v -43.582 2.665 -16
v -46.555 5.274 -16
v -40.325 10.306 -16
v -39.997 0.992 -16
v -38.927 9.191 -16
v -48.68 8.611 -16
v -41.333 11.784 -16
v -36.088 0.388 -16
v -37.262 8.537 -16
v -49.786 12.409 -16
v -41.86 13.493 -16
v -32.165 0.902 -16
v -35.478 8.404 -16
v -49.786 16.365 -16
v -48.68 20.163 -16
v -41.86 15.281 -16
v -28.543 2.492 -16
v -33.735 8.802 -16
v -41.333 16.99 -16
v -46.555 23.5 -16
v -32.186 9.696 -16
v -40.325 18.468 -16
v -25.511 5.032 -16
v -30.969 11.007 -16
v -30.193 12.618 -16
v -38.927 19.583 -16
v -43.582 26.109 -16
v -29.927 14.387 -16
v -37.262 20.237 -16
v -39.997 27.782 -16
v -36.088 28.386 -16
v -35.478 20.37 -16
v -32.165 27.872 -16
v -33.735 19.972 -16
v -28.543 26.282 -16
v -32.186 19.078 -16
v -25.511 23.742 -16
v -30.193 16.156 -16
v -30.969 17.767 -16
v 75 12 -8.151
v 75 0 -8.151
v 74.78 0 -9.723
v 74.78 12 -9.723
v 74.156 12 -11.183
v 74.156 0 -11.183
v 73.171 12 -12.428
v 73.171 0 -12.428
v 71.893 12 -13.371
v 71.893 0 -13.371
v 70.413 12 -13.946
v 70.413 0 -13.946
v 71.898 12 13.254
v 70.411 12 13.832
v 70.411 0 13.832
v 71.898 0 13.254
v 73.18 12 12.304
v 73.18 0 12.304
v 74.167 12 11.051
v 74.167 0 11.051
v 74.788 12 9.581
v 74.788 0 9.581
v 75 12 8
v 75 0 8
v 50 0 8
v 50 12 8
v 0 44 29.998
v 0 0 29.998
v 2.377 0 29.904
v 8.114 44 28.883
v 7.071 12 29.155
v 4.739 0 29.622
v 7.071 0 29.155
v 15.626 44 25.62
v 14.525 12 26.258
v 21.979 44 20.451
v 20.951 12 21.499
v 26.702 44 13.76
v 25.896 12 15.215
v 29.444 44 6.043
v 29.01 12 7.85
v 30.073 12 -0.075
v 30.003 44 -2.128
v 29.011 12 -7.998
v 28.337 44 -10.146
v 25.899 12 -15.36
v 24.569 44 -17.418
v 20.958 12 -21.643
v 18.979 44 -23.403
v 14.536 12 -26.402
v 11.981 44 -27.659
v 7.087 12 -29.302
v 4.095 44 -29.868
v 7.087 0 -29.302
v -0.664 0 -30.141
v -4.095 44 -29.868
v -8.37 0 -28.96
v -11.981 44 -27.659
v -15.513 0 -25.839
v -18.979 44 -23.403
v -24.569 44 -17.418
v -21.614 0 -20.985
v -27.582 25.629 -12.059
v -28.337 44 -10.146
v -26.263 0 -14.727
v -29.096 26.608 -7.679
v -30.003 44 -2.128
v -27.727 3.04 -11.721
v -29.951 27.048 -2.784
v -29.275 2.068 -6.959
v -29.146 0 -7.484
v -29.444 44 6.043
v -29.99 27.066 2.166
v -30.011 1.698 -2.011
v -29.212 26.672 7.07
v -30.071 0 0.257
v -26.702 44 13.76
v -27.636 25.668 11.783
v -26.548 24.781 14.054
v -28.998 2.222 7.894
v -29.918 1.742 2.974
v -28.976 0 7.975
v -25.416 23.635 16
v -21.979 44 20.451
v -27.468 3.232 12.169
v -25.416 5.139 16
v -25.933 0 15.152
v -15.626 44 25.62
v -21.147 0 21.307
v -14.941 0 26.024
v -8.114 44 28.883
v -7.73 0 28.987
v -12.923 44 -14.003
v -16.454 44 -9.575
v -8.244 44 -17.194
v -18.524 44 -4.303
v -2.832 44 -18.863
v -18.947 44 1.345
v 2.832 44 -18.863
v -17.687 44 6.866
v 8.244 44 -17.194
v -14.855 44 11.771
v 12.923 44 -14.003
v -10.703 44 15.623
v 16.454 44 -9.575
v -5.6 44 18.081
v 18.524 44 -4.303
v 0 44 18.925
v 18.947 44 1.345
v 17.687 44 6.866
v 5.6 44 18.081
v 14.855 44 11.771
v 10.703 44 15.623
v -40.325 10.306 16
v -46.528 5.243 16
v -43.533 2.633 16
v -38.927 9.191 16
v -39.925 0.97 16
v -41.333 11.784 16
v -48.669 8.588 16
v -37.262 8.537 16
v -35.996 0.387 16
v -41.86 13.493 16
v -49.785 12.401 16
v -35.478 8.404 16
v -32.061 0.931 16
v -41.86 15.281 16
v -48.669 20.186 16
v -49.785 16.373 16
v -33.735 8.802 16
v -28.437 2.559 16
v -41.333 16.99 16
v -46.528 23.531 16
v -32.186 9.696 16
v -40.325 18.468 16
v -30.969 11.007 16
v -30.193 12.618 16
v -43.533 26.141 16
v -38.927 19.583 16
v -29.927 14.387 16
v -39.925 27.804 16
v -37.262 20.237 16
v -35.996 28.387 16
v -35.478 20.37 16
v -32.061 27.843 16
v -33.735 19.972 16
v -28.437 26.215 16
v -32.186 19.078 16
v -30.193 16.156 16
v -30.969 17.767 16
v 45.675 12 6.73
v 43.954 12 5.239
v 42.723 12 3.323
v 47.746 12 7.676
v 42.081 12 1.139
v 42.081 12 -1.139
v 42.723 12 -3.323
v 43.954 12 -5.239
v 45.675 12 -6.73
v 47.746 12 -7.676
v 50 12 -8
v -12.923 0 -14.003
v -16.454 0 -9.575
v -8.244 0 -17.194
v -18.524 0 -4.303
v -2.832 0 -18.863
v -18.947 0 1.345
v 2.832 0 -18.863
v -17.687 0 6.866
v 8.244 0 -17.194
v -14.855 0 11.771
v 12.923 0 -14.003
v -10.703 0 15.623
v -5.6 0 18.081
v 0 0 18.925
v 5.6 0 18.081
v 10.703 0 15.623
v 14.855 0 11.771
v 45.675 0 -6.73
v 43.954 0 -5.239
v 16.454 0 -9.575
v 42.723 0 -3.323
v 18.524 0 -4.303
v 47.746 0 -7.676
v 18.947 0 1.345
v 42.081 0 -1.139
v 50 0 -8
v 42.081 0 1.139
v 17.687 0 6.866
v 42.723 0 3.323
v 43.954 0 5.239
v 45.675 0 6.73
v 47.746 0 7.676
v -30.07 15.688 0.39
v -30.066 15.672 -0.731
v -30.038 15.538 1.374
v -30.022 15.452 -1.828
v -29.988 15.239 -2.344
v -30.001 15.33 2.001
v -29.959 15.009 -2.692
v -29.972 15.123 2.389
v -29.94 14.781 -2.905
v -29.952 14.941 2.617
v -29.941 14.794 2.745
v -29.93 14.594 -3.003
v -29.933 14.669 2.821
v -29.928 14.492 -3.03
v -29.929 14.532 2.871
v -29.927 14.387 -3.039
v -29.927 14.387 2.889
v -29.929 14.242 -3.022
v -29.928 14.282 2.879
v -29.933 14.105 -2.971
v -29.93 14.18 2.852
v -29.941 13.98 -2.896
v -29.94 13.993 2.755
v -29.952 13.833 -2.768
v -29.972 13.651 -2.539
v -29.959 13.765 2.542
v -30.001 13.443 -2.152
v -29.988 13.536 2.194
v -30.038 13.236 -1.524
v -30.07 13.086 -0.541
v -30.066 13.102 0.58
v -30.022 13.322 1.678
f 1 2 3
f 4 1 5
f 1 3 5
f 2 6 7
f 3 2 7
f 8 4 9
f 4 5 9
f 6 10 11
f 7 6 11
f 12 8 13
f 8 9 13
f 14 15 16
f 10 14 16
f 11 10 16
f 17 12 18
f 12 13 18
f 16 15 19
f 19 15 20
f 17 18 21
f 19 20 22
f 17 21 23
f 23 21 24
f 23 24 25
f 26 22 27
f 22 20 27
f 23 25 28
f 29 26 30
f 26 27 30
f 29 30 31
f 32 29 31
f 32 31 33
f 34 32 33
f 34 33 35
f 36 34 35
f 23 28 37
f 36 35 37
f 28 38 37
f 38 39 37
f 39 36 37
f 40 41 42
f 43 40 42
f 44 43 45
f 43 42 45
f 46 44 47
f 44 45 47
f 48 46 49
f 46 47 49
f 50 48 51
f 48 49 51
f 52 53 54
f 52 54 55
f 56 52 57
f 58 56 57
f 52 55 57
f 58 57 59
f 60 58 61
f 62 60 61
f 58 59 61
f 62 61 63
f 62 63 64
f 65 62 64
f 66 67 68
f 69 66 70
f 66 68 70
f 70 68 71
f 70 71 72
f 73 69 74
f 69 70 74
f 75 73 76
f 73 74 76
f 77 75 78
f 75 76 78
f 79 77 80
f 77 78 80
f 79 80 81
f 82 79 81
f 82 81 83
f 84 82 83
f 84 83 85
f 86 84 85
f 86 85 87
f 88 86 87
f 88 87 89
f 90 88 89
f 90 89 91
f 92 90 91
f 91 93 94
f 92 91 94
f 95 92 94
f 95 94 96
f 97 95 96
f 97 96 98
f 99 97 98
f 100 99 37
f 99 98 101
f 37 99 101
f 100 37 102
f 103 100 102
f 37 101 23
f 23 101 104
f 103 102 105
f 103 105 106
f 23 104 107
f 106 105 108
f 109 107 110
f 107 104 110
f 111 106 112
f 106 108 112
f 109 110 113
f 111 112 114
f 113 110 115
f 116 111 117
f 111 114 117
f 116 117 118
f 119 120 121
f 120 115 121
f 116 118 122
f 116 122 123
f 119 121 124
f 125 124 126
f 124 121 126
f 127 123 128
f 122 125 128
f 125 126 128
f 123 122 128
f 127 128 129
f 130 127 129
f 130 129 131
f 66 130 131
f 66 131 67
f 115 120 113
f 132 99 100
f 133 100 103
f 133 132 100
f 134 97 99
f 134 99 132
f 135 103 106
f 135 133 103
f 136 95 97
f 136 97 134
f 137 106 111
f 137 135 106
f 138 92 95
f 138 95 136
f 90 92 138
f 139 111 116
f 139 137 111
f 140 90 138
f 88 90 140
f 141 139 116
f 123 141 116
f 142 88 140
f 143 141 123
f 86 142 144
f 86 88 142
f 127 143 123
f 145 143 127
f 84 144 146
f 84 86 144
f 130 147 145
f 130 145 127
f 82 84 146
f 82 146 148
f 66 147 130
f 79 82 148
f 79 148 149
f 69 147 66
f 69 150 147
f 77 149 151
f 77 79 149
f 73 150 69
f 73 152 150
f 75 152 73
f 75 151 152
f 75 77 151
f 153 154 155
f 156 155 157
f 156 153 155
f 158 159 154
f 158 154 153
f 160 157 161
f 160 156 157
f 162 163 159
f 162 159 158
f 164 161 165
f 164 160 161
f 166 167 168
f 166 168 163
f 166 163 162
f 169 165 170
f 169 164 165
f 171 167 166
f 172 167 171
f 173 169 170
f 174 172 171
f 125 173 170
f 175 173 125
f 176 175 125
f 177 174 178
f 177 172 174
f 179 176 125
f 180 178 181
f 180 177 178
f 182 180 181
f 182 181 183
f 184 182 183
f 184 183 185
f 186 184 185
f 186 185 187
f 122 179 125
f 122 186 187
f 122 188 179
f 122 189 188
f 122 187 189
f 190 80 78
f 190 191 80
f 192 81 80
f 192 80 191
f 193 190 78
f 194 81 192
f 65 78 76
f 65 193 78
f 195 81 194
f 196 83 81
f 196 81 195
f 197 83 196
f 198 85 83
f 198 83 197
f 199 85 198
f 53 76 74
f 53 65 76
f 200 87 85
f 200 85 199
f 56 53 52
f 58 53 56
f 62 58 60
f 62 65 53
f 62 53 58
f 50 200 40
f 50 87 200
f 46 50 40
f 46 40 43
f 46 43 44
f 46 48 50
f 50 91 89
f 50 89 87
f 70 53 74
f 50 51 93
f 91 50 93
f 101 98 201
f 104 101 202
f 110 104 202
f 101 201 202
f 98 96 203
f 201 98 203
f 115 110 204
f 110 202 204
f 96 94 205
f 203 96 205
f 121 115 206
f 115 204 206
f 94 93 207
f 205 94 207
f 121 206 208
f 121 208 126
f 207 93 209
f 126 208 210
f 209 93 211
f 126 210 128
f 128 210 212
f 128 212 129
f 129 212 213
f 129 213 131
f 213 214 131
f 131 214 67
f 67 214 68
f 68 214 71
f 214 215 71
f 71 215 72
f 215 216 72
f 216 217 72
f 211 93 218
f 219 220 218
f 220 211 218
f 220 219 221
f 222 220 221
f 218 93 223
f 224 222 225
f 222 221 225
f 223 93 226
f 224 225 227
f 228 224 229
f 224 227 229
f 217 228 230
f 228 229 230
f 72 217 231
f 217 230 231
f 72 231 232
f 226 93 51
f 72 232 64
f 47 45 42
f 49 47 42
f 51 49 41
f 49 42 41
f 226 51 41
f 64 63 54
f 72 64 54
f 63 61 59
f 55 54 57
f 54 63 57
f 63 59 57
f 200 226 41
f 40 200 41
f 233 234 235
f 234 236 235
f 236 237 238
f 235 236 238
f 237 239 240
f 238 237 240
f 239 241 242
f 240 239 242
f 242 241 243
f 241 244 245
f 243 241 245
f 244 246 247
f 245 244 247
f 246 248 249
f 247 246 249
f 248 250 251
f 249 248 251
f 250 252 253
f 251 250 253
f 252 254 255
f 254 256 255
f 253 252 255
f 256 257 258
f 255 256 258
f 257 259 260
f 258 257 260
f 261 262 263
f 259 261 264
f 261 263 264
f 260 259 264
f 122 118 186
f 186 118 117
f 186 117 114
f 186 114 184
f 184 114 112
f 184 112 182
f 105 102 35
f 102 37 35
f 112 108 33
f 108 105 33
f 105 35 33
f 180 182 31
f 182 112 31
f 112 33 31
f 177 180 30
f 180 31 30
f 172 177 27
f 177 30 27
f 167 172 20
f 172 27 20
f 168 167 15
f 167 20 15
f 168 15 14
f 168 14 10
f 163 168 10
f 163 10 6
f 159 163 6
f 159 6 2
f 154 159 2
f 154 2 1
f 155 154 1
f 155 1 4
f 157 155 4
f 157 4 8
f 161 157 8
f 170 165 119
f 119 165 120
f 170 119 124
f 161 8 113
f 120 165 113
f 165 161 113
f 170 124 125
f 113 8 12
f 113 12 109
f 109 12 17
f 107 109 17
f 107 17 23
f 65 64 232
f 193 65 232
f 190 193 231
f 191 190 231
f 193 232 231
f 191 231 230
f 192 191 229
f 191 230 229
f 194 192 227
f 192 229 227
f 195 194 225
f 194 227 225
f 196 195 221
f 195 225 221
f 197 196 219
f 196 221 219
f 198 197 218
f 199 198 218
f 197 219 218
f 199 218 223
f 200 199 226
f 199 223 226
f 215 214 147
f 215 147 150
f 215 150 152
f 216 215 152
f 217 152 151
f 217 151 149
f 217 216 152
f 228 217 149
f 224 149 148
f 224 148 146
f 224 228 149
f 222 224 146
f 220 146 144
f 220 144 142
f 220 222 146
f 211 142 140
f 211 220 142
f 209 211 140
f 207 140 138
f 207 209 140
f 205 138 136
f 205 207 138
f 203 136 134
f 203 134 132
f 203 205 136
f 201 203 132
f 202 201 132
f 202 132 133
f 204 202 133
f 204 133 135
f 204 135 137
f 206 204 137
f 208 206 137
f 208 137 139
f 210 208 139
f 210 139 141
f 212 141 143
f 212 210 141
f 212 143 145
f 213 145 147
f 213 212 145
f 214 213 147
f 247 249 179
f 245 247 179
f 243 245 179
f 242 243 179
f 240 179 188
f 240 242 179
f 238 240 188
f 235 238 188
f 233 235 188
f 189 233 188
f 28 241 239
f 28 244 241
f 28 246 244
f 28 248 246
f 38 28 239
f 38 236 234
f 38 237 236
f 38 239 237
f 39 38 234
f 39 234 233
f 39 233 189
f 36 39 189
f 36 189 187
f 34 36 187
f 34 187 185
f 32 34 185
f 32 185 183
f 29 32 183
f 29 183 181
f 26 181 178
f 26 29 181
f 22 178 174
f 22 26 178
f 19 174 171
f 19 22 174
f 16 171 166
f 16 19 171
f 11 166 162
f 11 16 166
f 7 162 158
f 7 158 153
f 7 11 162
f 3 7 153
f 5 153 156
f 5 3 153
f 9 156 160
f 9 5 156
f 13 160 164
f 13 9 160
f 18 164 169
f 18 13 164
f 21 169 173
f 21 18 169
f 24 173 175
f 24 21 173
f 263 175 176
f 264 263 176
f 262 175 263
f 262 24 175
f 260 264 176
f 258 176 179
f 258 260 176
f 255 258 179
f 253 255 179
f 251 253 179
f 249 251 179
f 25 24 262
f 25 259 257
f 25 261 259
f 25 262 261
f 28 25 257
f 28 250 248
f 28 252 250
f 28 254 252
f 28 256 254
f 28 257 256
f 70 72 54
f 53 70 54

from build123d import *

# Parameters (mm, degrees)
SKETCH_1_R           = 19
EXTRUDE_1_DEPTH      = 44
EXTRUDE_2_DEPTH      = 12
EXTRUDE_3_DEPTH      = 16
EXTRUDE_3_DEPTH_BACK = 16
SKETCH_2_R           = 14
SKETCH_2_R_2         = 6


with BuildPart() as part:
    # 草图1 → 凸台-拉伸1 (new body)
    with BuildSketch(Plane(origin=(0, 0, 0), x_dir=(1, 0, 0), z_dir=(0, 1, 0))):
        with BuildLine():
            ThreePointArc((30.073213795, 0.075325719), (23.638095307, 18.666684955), (7.08673549, 29.301621551))
            ThreePointArc((7.08673549, 29.301621551), (-30.073212741, 0.083288408), (7.071257605, -29.154718822))
            ThreePointArc((7.071257605, -29.154718822), (23.633171917, -18.522291685), (30.073213795, 0.075325719))
        make_face()
        with Locations((0, 0.075325719)):
            Circle(SKETCH_1_R, mode=Mode.SUBTRACT)
    extrude(amount=EXTRUDE_1_DEPTH)

    # 草图1<3> → 凸台-拉伸2 (add)
    with BuildSketch(Plane(origin=(0, 0, 0), x_dir=(1, 0, 0), z_dir=(0, 1, 0))):
        with BuildLine():
            ThreePointArc((50, -8), (42, 0), (50, 8))
            Line((50, 8), (75, 8.150651437))
            ThreePointArc((75, 8.150651437), (73.70484886, 11.838399085), (70.413394867, 13.946296092))
            Line((70.413394867, 13.946296092), (7.08673549, 29.301621551))
            ThreePointArc((7.08673549, 29.301621551), (23.638095307, 18.666684955), (30.073213795, 0.075325719))
            ThreePointArc((30.073213795, 0.075325719), (23.633171917, -18.522291685), (7.071257605, -29.154718822))
            Line((7.071257605, -29.154718822), (70.4108085, -13.831776691))
            ThreePointArc((70.4108085, -13.831776691), (73.715127305, -11.710468232), (75, -8))
            Line((75, -8), (50, -8))
        make_face()
    extrude(amount=EXTRUDE_2_DEPTH)

    # 草图2 → 凸台-拉伸3 (add, two sides: drawn at the far end of the back side and taken through both)
    with BuildSketch(Plane.XY.offset(-EXTRUDE_3_DEPTH_BACK)):
        with Locations((-35.926786205, 14.387019523)):
            Circle(SKETCH_2_R)
        with Locations((-35.926786205, 14.387019523)):
            Circle(SKETCH_2_R_2, mode=Mode.SUBTRACT)
    extrude(amount=EXTRUDE_3_DEPTH + EXTRUDE_3_DEPTH_BACK)


solid = part.part
